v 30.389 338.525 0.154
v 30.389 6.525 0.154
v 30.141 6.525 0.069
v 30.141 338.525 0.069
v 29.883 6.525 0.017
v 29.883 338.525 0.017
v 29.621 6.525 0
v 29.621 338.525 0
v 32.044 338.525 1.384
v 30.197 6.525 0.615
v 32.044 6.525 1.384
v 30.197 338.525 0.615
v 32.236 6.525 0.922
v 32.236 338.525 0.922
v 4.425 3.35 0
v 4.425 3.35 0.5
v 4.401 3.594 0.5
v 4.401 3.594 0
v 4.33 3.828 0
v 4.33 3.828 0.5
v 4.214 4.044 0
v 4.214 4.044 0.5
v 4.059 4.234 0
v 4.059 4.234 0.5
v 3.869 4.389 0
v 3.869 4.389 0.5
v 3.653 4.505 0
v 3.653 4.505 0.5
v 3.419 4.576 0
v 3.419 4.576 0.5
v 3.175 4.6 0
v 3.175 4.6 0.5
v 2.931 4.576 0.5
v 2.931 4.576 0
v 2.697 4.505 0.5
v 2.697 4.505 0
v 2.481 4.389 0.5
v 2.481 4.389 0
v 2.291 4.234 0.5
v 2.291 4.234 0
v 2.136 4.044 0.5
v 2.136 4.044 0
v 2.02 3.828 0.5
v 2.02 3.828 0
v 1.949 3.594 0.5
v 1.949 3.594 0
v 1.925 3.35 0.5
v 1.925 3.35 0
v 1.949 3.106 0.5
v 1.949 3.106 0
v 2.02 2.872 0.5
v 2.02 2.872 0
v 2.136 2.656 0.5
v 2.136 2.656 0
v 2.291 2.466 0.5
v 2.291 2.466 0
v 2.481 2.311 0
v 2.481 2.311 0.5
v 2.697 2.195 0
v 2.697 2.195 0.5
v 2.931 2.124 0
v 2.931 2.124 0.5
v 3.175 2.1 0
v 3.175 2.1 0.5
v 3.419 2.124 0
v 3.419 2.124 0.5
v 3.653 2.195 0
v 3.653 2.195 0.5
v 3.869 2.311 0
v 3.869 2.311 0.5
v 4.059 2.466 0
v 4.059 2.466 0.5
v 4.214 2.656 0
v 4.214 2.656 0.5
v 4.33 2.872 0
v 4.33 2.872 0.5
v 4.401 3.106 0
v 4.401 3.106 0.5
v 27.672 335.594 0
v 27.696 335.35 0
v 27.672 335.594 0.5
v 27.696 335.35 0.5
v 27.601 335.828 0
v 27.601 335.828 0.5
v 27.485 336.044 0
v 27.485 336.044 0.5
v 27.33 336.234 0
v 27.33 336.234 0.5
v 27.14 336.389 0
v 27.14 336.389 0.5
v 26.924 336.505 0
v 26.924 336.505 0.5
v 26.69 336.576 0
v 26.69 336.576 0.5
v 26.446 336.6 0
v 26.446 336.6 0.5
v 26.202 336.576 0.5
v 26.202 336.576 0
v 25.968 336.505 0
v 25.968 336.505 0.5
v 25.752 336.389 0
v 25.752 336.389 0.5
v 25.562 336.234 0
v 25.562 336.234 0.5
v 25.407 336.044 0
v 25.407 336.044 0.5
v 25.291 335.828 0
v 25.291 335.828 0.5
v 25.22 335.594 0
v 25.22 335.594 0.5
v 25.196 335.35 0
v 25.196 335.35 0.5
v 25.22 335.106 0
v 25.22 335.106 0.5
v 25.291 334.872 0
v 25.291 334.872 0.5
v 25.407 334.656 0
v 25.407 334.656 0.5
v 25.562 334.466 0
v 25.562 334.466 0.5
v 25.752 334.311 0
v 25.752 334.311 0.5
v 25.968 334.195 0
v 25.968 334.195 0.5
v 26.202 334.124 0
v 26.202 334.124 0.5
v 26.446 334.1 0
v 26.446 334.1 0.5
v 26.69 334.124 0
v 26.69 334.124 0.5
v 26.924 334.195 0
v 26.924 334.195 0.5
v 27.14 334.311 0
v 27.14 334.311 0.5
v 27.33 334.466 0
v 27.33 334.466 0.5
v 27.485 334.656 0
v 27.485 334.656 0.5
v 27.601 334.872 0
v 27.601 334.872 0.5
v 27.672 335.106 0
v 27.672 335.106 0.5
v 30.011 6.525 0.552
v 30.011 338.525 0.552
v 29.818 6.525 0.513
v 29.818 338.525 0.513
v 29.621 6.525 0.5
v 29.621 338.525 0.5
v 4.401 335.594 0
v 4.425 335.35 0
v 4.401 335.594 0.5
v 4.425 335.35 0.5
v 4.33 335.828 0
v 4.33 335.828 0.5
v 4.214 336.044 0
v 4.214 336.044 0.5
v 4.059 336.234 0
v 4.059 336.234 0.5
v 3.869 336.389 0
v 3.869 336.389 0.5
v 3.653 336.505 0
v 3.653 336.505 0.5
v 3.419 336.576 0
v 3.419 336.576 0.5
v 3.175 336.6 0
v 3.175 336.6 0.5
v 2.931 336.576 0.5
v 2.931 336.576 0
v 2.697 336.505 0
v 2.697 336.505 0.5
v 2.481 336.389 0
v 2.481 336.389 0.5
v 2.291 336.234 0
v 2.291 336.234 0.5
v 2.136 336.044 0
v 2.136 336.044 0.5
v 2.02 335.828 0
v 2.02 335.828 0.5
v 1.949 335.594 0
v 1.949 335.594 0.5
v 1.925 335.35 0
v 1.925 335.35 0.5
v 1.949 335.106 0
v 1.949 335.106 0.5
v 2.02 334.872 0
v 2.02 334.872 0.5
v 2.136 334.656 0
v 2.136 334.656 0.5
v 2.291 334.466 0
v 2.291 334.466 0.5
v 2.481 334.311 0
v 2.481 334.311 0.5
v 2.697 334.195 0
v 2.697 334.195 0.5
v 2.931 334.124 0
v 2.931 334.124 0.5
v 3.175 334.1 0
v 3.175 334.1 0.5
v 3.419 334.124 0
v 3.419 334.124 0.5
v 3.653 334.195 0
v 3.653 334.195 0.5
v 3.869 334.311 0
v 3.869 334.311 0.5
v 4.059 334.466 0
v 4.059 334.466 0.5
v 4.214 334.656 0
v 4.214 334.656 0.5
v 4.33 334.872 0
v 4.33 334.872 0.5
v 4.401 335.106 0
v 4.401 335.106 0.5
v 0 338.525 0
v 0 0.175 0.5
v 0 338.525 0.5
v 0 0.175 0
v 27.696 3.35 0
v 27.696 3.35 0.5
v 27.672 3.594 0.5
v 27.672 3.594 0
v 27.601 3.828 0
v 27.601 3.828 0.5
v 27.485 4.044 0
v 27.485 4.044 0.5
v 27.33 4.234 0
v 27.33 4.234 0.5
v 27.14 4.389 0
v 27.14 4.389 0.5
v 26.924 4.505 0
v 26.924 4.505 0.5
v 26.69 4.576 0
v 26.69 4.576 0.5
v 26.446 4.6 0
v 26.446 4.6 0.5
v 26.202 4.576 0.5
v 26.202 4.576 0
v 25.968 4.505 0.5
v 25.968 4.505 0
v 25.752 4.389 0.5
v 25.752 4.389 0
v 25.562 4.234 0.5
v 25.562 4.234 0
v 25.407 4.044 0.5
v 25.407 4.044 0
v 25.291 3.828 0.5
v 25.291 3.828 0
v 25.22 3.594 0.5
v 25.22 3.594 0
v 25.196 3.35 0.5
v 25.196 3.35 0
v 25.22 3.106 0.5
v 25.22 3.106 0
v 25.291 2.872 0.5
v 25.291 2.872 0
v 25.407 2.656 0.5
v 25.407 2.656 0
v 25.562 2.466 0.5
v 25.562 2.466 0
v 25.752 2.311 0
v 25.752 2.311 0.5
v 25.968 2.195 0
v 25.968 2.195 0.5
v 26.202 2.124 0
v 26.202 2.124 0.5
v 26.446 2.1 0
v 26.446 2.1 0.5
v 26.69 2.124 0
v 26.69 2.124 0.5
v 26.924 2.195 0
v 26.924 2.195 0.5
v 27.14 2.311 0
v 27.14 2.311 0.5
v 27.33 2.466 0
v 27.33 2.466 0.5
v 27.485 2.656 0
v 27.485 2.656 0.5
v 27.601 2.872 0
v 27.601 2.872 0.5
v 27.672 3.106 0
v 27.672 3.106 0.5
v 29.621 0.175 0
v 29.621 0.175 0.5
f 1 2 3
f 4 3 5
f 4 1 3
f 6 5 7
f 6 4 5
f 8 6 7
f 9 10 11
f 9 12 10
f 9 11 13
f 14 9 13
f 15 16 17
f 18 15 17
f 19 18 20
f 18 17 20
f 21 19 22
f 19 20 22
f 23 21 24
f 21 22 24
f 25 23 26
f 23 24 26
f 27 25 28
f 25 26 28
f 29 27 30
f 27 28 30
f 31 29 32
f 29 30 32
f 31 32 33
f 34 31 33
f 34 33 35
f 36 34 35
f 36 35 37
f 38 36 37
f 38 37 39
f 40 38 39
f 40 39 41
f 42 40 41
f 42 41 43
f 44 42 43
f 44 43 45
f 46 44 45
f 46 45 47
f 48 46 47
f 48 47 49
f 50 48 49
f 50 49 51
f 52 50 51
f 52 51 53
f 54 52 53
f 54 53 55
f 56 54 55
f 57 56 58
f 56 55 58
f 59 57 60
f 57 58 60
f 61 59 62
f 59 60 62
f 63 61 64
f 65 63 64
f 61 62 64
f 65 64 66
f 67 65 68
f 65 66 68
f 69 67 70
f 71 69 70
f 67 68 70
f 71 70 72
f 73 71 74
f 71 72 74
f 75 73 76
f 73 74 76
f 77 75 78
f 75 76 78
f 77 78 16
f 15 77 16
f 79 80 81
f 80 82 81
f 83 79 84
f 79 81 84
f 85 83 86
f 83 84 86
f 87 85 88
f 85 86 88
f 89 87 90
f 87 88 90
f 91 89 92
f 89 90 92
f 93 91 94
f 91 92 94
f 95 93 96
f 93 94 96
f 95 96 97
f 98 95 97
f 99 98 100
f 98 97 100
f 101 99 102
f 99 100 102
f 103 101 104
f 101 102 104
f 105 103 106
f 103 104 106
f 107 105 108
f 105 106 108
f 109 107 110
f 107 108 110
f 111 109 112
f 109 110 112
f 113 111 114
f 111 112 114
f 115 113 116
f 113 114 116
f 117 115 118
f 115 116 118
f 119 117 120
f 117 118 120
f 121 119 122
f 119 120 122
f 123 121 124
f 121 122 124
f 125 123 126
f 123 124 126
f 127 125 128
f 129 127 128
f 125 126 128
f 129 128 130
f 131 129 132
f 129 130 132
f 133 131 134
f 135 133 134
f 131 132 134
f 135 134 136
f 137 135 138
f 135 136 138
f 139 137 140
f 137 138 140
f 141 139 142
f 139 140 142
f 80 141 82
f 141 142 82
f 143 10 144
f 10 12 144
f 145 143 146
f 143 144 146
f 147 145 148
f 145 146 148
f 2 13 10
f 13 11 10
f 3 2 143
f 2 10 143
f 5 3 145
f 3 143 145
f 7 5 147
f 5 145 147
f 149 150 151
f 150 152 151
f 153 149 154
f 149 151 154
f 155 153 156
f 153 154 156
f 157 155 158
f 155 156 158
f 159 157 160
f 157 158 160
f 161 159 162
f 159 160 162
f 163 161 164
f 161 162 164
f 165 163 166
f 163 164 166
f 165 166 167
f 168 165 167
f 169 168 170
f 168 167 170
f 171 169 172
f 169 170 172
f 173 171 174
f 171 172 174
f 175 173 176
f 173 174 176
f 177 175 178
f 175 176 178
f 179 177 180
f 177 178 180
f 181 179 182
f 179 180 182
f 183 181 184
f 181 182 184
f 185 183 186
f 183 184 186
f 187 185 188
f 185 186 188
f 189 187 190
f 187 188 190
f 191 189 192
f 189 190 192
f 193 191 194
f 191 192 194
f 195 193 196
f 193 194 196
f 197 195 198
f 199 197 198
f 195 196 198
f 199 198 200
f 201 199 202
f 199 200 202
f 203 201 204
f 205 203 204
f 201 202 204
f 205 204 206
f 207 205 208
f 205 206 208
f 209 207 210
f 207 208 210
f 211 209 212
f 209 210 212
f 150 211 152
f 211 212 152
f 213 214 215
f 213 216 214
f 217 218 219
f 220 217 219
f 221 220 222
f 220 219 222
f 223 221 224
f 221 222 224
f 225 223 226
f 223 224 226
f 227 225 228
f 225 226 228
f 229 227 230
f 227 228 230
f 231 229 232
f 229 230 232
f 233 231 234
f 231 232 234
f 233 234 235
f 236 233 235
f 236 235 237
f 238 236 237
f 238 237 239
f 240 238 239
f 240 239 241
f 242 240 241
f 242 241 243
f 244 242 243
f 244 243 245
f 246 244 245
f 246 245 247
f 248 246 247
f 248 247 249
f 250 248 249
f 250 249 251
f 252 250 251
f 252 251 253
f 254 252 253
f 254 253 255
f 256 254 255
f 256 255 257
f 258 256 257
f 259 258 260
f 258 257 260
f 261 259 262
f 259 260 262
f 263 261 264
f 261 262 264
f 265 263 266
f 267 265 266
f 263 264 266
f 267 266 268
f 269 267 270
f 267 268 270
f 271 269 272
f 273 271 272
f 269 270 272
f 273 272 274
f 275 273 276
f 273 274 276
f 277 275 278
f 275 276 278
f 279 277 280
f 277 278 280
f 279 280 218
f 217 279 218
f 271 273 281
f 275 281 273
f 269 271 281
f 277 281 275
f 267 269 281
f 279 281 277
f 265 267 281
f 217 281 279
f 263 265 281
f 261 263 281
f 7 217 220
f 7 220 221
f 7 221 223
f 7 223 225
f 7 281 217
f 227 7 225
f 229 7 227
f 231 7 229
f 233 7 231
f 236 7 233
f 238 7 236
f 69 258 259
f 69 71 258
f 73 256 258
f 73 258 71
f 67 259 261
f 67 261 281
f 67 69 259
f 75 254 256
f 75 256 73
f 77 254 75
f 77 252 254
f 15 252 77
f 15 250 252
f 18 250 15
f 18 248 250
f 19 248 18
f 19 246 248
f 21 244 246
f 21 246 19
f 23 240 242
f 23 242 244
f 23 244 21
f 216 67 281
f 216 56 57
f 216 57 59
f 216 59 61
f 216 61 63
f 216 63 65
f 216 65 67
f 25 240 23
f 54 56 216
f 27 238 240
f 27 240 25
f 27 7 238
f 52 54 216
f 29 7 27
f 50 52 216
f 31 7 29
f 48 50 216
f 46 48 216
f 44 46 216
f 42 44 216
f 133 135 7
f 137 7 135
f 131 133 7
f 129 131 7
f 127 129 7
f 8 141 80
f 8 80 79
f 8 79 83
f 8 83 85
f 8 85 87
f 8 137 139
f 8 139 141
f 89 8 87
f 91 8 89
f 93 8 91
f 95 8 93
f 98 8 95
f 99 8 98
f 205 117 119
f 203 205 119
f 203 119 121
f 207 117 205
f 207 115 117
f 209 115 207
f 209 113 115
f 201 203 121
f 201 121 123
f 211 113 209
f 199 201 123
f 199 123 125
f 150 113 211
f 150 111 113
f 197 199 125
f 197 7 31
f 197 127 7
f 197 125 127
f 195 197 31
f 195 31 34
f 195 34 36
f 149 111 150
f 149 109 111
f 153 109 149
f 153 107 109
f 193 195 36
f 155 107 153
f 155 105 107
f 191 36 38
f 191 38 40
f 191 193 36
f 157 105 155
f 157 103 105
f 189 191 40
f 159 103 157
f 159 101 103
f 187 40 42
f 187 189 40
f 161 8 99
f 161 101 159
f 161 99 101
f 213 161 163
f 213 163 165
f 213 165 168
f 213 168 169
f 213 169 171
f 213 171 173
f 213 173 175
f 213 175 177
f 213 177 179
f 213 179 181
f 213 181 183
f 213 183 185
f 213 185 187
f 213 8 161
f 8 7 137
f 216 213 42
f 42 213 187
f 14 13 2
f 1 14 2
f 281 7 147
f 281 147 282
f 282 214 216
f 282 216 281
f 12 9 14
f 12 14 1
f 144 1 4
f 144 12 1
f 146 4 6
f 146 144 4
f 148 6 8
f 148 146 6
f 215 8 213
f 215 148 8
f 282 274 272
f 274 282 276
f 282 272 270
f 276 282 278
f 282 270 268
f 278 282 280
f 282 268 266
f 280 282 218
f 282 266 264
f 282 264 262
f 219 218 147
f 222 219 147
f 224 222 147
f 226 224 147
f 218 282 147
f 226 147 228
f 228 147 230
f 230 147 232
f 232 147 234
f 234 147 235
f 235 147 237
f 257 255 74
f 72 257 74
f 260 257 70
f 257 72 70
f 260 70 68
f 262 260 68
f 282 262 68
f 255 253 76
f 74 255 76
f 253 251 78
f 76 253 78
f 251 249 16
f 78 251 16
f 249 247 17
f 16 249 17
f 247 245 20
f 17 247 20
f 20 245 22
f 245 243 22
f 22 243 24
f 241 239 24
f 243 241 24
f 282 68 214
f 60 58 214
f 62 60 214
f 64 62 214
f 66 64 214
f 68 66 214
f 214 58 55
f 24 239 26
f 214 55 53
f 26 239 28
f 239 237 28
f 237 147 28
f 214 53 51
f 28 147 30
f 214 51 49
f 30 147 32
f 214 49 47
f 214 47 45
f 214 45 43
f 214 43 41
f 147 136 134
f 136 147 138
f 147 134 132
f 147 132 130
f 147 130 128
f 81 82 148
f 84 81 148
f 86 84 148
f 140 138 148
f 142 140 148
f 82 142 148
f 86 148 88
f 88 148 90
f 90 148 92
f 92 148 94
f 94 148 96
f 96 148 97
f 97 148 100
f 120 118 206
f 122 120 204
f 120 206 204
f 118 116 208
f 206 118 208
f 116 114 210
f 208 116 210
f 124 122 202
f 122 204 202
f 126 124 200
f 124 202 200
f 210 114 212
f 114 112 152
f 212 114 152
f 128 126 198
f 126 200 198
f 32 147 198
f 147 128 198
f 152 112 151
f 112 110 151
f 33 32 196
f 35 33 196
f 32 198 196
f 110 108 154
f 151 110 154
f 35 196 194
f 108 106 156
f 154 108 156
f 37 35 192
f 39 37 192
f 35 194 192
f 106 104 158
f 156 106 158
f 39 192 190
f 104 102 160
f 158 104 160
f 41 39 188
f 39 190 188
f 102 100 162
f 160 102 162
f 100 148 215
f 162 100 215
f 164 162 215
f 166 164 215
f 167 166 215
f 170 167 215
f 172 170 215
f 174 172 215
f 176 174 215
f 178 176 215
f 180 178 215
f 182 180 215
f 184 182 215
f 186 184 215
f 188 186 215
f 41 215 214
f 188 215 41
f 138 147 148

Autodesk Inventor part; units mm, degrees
ref_plane "YZ Plane" through (0, 0, 0) normal (1, 0, 0) x (0, 1, 0)
ref_plane "XZ Plane" through (0, 0, 0) normal (0, 1, 0) x (-1, 0, 0)
ref_plane "XY Plane" through (0, 0, 0) normal (0, 0, 1) x (1, 0, 0)
sketch "Sketch1" plane through (0, 0, 0) normal (0, 0, 1) x (1, 0, 0)
  line L0 (0, 0) -> (29.621, 0)
  line L1 (29.621, 0) -> (29.621, 338.525)
  line L2 (29.621, 338.525) -> (0, 338.525)
  line L3 (0, 338.525) -> (0, 0)
  dimension "d0" = 29.621
  dimension "d1" = 338.525
extrude "Plate1" add sketch "Sketch1" along normal blind 0.5
sketch "Sketch2" plane through (30.1974, 338.525, 0.6152) normal (0.3842953, 0, -0.9232102) x (0, 1, 0)
  line L0 (-338.525, 0) -> (0, 0)
  line L1 (0, 0) -> (0, 2.0004)
  line L2 (0, 2.0004) -> (-338.525, 2.0004)
  line L3 (-338.525, 2.0004) -> (-338.525, 0)
edge flange "Flange1" height 2.4 angle 22.6 thickness 0.5 bend radius 1.5 thickness toward (0.3842953, 0, -0.9232102) relief tear relief width 0.5 relief depth 0.25 edges at (29.621, 169.2625, 0.5) wall of the first edge with corners at (30.1974, 0, 0.6152) (30.1974, 338.525, 0.6152) (32.0442, 338.525, 1.3839) (32.0442, 0, 1.3839)
bend "Bend1"
corner "Corner1"
sketch "Sketch3" plane through (0, 0, 0) normal (0, 0, -1) x (-1, 0, 0)
  line L0 (0, 0) -> (-55.5693, 0)
  line L1 (-55.5693, 0) -> (-55.5693, 6.35)
  line L2 (-55.5693, 6.35) -> (0, 6.35)
  line L3 (0, 6.35) -> (0, 0)
  dimension "d13" = 6.35
extrude "Extrusion1" cut sketch "Sketch3" against normal blind 10
sketch "Sketch4" plane through (0, 0, 0) normal (0, 0, -1) x (-1, 0, 0)
  line L0 (0, 6.35) -> (-29.621, 6.35)
  line L1 (-29.621, 6.35) -> (-29.621, 0)
  line L2 (-29.621, 0) -> (0, 0)
  line L3 (0, 0) -> (0, 6.35)
extrude "Extrusion2" add sketch "Sketch4" against normal up to surface (0.5 mm away)
sketch "Sketch5" plane through (0, 0, 0.5) normal (0, 0, 1) x (1, 0, 0)
  line L0 (29.621, 6.35) -> (29.621, 0) projected
  line L1 (0, 0) -> (0, 3.175) construction
  line L2 (0, 0) -> (0, 338.525) construction
  line L3 (0, 3.175) -> (3.175, 3.175) construction
  line L4 (29.621, 0) -> (29.621, 3.175) construction
  line L5 (29.621, 3.175) -> (26.446, 3.175) construction
  line L6 (3.175, 3.175) -> (3.175, 3.35) construction
  circle A0 centre (3.175, 3.35) radius 1.25
  line L7 (26.446, 3.175) -> (26.446, 3.35) construction
  circle A1 centre (26.446, 3.35) radius 1.25
  dimension "d18" = 3.175
  dimension "d19" = 3.175
  dimension "d20" = 3.175
  dimension "d21" = 3.175
  dimension "d42" = 0.175
  dimension "d43" = 2.5
  dimension "d44" = 0.175
  dimension "d45" = 2.5
extrude "Extrusion3" cut sketch "Sketch5" against normal blind 10
sketch "Sketch6" plane through (0, 0, 0.5) normal (0, 0, 1) x (1, 0, 0)
  line L0 (0, 338.525) -> (0, 335.35) construction
  line L1 (0, 0) -> (0, 338.525) construction
  line L2 (0, 335.35) -> (3.175, 335.35) construction
  line L3 (29.621, 338.525) -> (29.621, 335.35) construction
  line L4 (29.621, 6.35) -> (29.621, 338.525) construction
  line L5 (29.621, 335.35) -> (26.446, 335.35) construction
  circle A0 centre (3.175, 335.35) radius 1.25
  circle A1 centre (26.446, 335.35) radius 1.25
  dimension "d26" = 3.175
  dimension "d27" = 3.175
  dimension "d28" = 3.175
  dimension "d29" = 3.175
  dimension "d34" = 2.5
  dimension "d35" = 2.5
extrude "Extrusion4" cut sketch "Sketch6" against normal blind 10
sketch "Sketch7" plane through (0, 0, 0.5) normal (0, 0, 1) x (1, 0, 0)
  line L0 (29.621, 6.35) -> (29.621, 0) projected
  line L1 (29.621, 6.35) -> (33.3489, 6.35)
  line L2 (33.3489, 6.35) -> (33.3489, 6.525)
  line L3 (33.3489, 6.525) -> (29.621, 6.525)
  line L4 (29.621, 6.525) -> (29.621, 6.35)
  line L5 (29.621, 0) -> (-2.8876, 0)
  line L6 (-2.8876, 0) -> (-2.8876, 0.175)
  line L7 (-2.8876, 0.175) -> (29.621, 0.175)
  line L8 (29.621, 0.175) -> (29.621, 0)
  dimension "d36" = 0.175
  dimension "d37" = 0.175
extrude "Extrusion5" cut sketch "Sketch7" against normal blind 10 and the other way blind 5
equation "\"d2\" = Thickness"
equation "\"d3\" = BendReliefWidth"
equation "\"d4\" = BendReliefDepth"
equation "\"d5\" = MinimumRemnant"
equation "\"d6\" = TransitionRadius"
equation "\"d10\" = CornerReliefSize"
equation "\"d11\" = GapSize"
equation "\"d12\" = JacobiRadiusSize"
equation "\"BendRadius\" = Thickness"
equation "\"BendReliefWidth\" = Thickness"
equation "\"BendReliefDepth\" = 0.5 * Thickness"
equation "\"CornerReliefSize\" = 4 * Thickness"
equation "\"MinimumRemnant\" = 2 * Thickness"
equation "\"TransitionRadius\" = BendRadius"
equation "\"JacobiRadiusSize\" = BendRadius"
equation "\"GapSize\" = Thickness"
equation "\"Thickness\" = 0.5"
properties part number "sideplate part 2 mirror"
